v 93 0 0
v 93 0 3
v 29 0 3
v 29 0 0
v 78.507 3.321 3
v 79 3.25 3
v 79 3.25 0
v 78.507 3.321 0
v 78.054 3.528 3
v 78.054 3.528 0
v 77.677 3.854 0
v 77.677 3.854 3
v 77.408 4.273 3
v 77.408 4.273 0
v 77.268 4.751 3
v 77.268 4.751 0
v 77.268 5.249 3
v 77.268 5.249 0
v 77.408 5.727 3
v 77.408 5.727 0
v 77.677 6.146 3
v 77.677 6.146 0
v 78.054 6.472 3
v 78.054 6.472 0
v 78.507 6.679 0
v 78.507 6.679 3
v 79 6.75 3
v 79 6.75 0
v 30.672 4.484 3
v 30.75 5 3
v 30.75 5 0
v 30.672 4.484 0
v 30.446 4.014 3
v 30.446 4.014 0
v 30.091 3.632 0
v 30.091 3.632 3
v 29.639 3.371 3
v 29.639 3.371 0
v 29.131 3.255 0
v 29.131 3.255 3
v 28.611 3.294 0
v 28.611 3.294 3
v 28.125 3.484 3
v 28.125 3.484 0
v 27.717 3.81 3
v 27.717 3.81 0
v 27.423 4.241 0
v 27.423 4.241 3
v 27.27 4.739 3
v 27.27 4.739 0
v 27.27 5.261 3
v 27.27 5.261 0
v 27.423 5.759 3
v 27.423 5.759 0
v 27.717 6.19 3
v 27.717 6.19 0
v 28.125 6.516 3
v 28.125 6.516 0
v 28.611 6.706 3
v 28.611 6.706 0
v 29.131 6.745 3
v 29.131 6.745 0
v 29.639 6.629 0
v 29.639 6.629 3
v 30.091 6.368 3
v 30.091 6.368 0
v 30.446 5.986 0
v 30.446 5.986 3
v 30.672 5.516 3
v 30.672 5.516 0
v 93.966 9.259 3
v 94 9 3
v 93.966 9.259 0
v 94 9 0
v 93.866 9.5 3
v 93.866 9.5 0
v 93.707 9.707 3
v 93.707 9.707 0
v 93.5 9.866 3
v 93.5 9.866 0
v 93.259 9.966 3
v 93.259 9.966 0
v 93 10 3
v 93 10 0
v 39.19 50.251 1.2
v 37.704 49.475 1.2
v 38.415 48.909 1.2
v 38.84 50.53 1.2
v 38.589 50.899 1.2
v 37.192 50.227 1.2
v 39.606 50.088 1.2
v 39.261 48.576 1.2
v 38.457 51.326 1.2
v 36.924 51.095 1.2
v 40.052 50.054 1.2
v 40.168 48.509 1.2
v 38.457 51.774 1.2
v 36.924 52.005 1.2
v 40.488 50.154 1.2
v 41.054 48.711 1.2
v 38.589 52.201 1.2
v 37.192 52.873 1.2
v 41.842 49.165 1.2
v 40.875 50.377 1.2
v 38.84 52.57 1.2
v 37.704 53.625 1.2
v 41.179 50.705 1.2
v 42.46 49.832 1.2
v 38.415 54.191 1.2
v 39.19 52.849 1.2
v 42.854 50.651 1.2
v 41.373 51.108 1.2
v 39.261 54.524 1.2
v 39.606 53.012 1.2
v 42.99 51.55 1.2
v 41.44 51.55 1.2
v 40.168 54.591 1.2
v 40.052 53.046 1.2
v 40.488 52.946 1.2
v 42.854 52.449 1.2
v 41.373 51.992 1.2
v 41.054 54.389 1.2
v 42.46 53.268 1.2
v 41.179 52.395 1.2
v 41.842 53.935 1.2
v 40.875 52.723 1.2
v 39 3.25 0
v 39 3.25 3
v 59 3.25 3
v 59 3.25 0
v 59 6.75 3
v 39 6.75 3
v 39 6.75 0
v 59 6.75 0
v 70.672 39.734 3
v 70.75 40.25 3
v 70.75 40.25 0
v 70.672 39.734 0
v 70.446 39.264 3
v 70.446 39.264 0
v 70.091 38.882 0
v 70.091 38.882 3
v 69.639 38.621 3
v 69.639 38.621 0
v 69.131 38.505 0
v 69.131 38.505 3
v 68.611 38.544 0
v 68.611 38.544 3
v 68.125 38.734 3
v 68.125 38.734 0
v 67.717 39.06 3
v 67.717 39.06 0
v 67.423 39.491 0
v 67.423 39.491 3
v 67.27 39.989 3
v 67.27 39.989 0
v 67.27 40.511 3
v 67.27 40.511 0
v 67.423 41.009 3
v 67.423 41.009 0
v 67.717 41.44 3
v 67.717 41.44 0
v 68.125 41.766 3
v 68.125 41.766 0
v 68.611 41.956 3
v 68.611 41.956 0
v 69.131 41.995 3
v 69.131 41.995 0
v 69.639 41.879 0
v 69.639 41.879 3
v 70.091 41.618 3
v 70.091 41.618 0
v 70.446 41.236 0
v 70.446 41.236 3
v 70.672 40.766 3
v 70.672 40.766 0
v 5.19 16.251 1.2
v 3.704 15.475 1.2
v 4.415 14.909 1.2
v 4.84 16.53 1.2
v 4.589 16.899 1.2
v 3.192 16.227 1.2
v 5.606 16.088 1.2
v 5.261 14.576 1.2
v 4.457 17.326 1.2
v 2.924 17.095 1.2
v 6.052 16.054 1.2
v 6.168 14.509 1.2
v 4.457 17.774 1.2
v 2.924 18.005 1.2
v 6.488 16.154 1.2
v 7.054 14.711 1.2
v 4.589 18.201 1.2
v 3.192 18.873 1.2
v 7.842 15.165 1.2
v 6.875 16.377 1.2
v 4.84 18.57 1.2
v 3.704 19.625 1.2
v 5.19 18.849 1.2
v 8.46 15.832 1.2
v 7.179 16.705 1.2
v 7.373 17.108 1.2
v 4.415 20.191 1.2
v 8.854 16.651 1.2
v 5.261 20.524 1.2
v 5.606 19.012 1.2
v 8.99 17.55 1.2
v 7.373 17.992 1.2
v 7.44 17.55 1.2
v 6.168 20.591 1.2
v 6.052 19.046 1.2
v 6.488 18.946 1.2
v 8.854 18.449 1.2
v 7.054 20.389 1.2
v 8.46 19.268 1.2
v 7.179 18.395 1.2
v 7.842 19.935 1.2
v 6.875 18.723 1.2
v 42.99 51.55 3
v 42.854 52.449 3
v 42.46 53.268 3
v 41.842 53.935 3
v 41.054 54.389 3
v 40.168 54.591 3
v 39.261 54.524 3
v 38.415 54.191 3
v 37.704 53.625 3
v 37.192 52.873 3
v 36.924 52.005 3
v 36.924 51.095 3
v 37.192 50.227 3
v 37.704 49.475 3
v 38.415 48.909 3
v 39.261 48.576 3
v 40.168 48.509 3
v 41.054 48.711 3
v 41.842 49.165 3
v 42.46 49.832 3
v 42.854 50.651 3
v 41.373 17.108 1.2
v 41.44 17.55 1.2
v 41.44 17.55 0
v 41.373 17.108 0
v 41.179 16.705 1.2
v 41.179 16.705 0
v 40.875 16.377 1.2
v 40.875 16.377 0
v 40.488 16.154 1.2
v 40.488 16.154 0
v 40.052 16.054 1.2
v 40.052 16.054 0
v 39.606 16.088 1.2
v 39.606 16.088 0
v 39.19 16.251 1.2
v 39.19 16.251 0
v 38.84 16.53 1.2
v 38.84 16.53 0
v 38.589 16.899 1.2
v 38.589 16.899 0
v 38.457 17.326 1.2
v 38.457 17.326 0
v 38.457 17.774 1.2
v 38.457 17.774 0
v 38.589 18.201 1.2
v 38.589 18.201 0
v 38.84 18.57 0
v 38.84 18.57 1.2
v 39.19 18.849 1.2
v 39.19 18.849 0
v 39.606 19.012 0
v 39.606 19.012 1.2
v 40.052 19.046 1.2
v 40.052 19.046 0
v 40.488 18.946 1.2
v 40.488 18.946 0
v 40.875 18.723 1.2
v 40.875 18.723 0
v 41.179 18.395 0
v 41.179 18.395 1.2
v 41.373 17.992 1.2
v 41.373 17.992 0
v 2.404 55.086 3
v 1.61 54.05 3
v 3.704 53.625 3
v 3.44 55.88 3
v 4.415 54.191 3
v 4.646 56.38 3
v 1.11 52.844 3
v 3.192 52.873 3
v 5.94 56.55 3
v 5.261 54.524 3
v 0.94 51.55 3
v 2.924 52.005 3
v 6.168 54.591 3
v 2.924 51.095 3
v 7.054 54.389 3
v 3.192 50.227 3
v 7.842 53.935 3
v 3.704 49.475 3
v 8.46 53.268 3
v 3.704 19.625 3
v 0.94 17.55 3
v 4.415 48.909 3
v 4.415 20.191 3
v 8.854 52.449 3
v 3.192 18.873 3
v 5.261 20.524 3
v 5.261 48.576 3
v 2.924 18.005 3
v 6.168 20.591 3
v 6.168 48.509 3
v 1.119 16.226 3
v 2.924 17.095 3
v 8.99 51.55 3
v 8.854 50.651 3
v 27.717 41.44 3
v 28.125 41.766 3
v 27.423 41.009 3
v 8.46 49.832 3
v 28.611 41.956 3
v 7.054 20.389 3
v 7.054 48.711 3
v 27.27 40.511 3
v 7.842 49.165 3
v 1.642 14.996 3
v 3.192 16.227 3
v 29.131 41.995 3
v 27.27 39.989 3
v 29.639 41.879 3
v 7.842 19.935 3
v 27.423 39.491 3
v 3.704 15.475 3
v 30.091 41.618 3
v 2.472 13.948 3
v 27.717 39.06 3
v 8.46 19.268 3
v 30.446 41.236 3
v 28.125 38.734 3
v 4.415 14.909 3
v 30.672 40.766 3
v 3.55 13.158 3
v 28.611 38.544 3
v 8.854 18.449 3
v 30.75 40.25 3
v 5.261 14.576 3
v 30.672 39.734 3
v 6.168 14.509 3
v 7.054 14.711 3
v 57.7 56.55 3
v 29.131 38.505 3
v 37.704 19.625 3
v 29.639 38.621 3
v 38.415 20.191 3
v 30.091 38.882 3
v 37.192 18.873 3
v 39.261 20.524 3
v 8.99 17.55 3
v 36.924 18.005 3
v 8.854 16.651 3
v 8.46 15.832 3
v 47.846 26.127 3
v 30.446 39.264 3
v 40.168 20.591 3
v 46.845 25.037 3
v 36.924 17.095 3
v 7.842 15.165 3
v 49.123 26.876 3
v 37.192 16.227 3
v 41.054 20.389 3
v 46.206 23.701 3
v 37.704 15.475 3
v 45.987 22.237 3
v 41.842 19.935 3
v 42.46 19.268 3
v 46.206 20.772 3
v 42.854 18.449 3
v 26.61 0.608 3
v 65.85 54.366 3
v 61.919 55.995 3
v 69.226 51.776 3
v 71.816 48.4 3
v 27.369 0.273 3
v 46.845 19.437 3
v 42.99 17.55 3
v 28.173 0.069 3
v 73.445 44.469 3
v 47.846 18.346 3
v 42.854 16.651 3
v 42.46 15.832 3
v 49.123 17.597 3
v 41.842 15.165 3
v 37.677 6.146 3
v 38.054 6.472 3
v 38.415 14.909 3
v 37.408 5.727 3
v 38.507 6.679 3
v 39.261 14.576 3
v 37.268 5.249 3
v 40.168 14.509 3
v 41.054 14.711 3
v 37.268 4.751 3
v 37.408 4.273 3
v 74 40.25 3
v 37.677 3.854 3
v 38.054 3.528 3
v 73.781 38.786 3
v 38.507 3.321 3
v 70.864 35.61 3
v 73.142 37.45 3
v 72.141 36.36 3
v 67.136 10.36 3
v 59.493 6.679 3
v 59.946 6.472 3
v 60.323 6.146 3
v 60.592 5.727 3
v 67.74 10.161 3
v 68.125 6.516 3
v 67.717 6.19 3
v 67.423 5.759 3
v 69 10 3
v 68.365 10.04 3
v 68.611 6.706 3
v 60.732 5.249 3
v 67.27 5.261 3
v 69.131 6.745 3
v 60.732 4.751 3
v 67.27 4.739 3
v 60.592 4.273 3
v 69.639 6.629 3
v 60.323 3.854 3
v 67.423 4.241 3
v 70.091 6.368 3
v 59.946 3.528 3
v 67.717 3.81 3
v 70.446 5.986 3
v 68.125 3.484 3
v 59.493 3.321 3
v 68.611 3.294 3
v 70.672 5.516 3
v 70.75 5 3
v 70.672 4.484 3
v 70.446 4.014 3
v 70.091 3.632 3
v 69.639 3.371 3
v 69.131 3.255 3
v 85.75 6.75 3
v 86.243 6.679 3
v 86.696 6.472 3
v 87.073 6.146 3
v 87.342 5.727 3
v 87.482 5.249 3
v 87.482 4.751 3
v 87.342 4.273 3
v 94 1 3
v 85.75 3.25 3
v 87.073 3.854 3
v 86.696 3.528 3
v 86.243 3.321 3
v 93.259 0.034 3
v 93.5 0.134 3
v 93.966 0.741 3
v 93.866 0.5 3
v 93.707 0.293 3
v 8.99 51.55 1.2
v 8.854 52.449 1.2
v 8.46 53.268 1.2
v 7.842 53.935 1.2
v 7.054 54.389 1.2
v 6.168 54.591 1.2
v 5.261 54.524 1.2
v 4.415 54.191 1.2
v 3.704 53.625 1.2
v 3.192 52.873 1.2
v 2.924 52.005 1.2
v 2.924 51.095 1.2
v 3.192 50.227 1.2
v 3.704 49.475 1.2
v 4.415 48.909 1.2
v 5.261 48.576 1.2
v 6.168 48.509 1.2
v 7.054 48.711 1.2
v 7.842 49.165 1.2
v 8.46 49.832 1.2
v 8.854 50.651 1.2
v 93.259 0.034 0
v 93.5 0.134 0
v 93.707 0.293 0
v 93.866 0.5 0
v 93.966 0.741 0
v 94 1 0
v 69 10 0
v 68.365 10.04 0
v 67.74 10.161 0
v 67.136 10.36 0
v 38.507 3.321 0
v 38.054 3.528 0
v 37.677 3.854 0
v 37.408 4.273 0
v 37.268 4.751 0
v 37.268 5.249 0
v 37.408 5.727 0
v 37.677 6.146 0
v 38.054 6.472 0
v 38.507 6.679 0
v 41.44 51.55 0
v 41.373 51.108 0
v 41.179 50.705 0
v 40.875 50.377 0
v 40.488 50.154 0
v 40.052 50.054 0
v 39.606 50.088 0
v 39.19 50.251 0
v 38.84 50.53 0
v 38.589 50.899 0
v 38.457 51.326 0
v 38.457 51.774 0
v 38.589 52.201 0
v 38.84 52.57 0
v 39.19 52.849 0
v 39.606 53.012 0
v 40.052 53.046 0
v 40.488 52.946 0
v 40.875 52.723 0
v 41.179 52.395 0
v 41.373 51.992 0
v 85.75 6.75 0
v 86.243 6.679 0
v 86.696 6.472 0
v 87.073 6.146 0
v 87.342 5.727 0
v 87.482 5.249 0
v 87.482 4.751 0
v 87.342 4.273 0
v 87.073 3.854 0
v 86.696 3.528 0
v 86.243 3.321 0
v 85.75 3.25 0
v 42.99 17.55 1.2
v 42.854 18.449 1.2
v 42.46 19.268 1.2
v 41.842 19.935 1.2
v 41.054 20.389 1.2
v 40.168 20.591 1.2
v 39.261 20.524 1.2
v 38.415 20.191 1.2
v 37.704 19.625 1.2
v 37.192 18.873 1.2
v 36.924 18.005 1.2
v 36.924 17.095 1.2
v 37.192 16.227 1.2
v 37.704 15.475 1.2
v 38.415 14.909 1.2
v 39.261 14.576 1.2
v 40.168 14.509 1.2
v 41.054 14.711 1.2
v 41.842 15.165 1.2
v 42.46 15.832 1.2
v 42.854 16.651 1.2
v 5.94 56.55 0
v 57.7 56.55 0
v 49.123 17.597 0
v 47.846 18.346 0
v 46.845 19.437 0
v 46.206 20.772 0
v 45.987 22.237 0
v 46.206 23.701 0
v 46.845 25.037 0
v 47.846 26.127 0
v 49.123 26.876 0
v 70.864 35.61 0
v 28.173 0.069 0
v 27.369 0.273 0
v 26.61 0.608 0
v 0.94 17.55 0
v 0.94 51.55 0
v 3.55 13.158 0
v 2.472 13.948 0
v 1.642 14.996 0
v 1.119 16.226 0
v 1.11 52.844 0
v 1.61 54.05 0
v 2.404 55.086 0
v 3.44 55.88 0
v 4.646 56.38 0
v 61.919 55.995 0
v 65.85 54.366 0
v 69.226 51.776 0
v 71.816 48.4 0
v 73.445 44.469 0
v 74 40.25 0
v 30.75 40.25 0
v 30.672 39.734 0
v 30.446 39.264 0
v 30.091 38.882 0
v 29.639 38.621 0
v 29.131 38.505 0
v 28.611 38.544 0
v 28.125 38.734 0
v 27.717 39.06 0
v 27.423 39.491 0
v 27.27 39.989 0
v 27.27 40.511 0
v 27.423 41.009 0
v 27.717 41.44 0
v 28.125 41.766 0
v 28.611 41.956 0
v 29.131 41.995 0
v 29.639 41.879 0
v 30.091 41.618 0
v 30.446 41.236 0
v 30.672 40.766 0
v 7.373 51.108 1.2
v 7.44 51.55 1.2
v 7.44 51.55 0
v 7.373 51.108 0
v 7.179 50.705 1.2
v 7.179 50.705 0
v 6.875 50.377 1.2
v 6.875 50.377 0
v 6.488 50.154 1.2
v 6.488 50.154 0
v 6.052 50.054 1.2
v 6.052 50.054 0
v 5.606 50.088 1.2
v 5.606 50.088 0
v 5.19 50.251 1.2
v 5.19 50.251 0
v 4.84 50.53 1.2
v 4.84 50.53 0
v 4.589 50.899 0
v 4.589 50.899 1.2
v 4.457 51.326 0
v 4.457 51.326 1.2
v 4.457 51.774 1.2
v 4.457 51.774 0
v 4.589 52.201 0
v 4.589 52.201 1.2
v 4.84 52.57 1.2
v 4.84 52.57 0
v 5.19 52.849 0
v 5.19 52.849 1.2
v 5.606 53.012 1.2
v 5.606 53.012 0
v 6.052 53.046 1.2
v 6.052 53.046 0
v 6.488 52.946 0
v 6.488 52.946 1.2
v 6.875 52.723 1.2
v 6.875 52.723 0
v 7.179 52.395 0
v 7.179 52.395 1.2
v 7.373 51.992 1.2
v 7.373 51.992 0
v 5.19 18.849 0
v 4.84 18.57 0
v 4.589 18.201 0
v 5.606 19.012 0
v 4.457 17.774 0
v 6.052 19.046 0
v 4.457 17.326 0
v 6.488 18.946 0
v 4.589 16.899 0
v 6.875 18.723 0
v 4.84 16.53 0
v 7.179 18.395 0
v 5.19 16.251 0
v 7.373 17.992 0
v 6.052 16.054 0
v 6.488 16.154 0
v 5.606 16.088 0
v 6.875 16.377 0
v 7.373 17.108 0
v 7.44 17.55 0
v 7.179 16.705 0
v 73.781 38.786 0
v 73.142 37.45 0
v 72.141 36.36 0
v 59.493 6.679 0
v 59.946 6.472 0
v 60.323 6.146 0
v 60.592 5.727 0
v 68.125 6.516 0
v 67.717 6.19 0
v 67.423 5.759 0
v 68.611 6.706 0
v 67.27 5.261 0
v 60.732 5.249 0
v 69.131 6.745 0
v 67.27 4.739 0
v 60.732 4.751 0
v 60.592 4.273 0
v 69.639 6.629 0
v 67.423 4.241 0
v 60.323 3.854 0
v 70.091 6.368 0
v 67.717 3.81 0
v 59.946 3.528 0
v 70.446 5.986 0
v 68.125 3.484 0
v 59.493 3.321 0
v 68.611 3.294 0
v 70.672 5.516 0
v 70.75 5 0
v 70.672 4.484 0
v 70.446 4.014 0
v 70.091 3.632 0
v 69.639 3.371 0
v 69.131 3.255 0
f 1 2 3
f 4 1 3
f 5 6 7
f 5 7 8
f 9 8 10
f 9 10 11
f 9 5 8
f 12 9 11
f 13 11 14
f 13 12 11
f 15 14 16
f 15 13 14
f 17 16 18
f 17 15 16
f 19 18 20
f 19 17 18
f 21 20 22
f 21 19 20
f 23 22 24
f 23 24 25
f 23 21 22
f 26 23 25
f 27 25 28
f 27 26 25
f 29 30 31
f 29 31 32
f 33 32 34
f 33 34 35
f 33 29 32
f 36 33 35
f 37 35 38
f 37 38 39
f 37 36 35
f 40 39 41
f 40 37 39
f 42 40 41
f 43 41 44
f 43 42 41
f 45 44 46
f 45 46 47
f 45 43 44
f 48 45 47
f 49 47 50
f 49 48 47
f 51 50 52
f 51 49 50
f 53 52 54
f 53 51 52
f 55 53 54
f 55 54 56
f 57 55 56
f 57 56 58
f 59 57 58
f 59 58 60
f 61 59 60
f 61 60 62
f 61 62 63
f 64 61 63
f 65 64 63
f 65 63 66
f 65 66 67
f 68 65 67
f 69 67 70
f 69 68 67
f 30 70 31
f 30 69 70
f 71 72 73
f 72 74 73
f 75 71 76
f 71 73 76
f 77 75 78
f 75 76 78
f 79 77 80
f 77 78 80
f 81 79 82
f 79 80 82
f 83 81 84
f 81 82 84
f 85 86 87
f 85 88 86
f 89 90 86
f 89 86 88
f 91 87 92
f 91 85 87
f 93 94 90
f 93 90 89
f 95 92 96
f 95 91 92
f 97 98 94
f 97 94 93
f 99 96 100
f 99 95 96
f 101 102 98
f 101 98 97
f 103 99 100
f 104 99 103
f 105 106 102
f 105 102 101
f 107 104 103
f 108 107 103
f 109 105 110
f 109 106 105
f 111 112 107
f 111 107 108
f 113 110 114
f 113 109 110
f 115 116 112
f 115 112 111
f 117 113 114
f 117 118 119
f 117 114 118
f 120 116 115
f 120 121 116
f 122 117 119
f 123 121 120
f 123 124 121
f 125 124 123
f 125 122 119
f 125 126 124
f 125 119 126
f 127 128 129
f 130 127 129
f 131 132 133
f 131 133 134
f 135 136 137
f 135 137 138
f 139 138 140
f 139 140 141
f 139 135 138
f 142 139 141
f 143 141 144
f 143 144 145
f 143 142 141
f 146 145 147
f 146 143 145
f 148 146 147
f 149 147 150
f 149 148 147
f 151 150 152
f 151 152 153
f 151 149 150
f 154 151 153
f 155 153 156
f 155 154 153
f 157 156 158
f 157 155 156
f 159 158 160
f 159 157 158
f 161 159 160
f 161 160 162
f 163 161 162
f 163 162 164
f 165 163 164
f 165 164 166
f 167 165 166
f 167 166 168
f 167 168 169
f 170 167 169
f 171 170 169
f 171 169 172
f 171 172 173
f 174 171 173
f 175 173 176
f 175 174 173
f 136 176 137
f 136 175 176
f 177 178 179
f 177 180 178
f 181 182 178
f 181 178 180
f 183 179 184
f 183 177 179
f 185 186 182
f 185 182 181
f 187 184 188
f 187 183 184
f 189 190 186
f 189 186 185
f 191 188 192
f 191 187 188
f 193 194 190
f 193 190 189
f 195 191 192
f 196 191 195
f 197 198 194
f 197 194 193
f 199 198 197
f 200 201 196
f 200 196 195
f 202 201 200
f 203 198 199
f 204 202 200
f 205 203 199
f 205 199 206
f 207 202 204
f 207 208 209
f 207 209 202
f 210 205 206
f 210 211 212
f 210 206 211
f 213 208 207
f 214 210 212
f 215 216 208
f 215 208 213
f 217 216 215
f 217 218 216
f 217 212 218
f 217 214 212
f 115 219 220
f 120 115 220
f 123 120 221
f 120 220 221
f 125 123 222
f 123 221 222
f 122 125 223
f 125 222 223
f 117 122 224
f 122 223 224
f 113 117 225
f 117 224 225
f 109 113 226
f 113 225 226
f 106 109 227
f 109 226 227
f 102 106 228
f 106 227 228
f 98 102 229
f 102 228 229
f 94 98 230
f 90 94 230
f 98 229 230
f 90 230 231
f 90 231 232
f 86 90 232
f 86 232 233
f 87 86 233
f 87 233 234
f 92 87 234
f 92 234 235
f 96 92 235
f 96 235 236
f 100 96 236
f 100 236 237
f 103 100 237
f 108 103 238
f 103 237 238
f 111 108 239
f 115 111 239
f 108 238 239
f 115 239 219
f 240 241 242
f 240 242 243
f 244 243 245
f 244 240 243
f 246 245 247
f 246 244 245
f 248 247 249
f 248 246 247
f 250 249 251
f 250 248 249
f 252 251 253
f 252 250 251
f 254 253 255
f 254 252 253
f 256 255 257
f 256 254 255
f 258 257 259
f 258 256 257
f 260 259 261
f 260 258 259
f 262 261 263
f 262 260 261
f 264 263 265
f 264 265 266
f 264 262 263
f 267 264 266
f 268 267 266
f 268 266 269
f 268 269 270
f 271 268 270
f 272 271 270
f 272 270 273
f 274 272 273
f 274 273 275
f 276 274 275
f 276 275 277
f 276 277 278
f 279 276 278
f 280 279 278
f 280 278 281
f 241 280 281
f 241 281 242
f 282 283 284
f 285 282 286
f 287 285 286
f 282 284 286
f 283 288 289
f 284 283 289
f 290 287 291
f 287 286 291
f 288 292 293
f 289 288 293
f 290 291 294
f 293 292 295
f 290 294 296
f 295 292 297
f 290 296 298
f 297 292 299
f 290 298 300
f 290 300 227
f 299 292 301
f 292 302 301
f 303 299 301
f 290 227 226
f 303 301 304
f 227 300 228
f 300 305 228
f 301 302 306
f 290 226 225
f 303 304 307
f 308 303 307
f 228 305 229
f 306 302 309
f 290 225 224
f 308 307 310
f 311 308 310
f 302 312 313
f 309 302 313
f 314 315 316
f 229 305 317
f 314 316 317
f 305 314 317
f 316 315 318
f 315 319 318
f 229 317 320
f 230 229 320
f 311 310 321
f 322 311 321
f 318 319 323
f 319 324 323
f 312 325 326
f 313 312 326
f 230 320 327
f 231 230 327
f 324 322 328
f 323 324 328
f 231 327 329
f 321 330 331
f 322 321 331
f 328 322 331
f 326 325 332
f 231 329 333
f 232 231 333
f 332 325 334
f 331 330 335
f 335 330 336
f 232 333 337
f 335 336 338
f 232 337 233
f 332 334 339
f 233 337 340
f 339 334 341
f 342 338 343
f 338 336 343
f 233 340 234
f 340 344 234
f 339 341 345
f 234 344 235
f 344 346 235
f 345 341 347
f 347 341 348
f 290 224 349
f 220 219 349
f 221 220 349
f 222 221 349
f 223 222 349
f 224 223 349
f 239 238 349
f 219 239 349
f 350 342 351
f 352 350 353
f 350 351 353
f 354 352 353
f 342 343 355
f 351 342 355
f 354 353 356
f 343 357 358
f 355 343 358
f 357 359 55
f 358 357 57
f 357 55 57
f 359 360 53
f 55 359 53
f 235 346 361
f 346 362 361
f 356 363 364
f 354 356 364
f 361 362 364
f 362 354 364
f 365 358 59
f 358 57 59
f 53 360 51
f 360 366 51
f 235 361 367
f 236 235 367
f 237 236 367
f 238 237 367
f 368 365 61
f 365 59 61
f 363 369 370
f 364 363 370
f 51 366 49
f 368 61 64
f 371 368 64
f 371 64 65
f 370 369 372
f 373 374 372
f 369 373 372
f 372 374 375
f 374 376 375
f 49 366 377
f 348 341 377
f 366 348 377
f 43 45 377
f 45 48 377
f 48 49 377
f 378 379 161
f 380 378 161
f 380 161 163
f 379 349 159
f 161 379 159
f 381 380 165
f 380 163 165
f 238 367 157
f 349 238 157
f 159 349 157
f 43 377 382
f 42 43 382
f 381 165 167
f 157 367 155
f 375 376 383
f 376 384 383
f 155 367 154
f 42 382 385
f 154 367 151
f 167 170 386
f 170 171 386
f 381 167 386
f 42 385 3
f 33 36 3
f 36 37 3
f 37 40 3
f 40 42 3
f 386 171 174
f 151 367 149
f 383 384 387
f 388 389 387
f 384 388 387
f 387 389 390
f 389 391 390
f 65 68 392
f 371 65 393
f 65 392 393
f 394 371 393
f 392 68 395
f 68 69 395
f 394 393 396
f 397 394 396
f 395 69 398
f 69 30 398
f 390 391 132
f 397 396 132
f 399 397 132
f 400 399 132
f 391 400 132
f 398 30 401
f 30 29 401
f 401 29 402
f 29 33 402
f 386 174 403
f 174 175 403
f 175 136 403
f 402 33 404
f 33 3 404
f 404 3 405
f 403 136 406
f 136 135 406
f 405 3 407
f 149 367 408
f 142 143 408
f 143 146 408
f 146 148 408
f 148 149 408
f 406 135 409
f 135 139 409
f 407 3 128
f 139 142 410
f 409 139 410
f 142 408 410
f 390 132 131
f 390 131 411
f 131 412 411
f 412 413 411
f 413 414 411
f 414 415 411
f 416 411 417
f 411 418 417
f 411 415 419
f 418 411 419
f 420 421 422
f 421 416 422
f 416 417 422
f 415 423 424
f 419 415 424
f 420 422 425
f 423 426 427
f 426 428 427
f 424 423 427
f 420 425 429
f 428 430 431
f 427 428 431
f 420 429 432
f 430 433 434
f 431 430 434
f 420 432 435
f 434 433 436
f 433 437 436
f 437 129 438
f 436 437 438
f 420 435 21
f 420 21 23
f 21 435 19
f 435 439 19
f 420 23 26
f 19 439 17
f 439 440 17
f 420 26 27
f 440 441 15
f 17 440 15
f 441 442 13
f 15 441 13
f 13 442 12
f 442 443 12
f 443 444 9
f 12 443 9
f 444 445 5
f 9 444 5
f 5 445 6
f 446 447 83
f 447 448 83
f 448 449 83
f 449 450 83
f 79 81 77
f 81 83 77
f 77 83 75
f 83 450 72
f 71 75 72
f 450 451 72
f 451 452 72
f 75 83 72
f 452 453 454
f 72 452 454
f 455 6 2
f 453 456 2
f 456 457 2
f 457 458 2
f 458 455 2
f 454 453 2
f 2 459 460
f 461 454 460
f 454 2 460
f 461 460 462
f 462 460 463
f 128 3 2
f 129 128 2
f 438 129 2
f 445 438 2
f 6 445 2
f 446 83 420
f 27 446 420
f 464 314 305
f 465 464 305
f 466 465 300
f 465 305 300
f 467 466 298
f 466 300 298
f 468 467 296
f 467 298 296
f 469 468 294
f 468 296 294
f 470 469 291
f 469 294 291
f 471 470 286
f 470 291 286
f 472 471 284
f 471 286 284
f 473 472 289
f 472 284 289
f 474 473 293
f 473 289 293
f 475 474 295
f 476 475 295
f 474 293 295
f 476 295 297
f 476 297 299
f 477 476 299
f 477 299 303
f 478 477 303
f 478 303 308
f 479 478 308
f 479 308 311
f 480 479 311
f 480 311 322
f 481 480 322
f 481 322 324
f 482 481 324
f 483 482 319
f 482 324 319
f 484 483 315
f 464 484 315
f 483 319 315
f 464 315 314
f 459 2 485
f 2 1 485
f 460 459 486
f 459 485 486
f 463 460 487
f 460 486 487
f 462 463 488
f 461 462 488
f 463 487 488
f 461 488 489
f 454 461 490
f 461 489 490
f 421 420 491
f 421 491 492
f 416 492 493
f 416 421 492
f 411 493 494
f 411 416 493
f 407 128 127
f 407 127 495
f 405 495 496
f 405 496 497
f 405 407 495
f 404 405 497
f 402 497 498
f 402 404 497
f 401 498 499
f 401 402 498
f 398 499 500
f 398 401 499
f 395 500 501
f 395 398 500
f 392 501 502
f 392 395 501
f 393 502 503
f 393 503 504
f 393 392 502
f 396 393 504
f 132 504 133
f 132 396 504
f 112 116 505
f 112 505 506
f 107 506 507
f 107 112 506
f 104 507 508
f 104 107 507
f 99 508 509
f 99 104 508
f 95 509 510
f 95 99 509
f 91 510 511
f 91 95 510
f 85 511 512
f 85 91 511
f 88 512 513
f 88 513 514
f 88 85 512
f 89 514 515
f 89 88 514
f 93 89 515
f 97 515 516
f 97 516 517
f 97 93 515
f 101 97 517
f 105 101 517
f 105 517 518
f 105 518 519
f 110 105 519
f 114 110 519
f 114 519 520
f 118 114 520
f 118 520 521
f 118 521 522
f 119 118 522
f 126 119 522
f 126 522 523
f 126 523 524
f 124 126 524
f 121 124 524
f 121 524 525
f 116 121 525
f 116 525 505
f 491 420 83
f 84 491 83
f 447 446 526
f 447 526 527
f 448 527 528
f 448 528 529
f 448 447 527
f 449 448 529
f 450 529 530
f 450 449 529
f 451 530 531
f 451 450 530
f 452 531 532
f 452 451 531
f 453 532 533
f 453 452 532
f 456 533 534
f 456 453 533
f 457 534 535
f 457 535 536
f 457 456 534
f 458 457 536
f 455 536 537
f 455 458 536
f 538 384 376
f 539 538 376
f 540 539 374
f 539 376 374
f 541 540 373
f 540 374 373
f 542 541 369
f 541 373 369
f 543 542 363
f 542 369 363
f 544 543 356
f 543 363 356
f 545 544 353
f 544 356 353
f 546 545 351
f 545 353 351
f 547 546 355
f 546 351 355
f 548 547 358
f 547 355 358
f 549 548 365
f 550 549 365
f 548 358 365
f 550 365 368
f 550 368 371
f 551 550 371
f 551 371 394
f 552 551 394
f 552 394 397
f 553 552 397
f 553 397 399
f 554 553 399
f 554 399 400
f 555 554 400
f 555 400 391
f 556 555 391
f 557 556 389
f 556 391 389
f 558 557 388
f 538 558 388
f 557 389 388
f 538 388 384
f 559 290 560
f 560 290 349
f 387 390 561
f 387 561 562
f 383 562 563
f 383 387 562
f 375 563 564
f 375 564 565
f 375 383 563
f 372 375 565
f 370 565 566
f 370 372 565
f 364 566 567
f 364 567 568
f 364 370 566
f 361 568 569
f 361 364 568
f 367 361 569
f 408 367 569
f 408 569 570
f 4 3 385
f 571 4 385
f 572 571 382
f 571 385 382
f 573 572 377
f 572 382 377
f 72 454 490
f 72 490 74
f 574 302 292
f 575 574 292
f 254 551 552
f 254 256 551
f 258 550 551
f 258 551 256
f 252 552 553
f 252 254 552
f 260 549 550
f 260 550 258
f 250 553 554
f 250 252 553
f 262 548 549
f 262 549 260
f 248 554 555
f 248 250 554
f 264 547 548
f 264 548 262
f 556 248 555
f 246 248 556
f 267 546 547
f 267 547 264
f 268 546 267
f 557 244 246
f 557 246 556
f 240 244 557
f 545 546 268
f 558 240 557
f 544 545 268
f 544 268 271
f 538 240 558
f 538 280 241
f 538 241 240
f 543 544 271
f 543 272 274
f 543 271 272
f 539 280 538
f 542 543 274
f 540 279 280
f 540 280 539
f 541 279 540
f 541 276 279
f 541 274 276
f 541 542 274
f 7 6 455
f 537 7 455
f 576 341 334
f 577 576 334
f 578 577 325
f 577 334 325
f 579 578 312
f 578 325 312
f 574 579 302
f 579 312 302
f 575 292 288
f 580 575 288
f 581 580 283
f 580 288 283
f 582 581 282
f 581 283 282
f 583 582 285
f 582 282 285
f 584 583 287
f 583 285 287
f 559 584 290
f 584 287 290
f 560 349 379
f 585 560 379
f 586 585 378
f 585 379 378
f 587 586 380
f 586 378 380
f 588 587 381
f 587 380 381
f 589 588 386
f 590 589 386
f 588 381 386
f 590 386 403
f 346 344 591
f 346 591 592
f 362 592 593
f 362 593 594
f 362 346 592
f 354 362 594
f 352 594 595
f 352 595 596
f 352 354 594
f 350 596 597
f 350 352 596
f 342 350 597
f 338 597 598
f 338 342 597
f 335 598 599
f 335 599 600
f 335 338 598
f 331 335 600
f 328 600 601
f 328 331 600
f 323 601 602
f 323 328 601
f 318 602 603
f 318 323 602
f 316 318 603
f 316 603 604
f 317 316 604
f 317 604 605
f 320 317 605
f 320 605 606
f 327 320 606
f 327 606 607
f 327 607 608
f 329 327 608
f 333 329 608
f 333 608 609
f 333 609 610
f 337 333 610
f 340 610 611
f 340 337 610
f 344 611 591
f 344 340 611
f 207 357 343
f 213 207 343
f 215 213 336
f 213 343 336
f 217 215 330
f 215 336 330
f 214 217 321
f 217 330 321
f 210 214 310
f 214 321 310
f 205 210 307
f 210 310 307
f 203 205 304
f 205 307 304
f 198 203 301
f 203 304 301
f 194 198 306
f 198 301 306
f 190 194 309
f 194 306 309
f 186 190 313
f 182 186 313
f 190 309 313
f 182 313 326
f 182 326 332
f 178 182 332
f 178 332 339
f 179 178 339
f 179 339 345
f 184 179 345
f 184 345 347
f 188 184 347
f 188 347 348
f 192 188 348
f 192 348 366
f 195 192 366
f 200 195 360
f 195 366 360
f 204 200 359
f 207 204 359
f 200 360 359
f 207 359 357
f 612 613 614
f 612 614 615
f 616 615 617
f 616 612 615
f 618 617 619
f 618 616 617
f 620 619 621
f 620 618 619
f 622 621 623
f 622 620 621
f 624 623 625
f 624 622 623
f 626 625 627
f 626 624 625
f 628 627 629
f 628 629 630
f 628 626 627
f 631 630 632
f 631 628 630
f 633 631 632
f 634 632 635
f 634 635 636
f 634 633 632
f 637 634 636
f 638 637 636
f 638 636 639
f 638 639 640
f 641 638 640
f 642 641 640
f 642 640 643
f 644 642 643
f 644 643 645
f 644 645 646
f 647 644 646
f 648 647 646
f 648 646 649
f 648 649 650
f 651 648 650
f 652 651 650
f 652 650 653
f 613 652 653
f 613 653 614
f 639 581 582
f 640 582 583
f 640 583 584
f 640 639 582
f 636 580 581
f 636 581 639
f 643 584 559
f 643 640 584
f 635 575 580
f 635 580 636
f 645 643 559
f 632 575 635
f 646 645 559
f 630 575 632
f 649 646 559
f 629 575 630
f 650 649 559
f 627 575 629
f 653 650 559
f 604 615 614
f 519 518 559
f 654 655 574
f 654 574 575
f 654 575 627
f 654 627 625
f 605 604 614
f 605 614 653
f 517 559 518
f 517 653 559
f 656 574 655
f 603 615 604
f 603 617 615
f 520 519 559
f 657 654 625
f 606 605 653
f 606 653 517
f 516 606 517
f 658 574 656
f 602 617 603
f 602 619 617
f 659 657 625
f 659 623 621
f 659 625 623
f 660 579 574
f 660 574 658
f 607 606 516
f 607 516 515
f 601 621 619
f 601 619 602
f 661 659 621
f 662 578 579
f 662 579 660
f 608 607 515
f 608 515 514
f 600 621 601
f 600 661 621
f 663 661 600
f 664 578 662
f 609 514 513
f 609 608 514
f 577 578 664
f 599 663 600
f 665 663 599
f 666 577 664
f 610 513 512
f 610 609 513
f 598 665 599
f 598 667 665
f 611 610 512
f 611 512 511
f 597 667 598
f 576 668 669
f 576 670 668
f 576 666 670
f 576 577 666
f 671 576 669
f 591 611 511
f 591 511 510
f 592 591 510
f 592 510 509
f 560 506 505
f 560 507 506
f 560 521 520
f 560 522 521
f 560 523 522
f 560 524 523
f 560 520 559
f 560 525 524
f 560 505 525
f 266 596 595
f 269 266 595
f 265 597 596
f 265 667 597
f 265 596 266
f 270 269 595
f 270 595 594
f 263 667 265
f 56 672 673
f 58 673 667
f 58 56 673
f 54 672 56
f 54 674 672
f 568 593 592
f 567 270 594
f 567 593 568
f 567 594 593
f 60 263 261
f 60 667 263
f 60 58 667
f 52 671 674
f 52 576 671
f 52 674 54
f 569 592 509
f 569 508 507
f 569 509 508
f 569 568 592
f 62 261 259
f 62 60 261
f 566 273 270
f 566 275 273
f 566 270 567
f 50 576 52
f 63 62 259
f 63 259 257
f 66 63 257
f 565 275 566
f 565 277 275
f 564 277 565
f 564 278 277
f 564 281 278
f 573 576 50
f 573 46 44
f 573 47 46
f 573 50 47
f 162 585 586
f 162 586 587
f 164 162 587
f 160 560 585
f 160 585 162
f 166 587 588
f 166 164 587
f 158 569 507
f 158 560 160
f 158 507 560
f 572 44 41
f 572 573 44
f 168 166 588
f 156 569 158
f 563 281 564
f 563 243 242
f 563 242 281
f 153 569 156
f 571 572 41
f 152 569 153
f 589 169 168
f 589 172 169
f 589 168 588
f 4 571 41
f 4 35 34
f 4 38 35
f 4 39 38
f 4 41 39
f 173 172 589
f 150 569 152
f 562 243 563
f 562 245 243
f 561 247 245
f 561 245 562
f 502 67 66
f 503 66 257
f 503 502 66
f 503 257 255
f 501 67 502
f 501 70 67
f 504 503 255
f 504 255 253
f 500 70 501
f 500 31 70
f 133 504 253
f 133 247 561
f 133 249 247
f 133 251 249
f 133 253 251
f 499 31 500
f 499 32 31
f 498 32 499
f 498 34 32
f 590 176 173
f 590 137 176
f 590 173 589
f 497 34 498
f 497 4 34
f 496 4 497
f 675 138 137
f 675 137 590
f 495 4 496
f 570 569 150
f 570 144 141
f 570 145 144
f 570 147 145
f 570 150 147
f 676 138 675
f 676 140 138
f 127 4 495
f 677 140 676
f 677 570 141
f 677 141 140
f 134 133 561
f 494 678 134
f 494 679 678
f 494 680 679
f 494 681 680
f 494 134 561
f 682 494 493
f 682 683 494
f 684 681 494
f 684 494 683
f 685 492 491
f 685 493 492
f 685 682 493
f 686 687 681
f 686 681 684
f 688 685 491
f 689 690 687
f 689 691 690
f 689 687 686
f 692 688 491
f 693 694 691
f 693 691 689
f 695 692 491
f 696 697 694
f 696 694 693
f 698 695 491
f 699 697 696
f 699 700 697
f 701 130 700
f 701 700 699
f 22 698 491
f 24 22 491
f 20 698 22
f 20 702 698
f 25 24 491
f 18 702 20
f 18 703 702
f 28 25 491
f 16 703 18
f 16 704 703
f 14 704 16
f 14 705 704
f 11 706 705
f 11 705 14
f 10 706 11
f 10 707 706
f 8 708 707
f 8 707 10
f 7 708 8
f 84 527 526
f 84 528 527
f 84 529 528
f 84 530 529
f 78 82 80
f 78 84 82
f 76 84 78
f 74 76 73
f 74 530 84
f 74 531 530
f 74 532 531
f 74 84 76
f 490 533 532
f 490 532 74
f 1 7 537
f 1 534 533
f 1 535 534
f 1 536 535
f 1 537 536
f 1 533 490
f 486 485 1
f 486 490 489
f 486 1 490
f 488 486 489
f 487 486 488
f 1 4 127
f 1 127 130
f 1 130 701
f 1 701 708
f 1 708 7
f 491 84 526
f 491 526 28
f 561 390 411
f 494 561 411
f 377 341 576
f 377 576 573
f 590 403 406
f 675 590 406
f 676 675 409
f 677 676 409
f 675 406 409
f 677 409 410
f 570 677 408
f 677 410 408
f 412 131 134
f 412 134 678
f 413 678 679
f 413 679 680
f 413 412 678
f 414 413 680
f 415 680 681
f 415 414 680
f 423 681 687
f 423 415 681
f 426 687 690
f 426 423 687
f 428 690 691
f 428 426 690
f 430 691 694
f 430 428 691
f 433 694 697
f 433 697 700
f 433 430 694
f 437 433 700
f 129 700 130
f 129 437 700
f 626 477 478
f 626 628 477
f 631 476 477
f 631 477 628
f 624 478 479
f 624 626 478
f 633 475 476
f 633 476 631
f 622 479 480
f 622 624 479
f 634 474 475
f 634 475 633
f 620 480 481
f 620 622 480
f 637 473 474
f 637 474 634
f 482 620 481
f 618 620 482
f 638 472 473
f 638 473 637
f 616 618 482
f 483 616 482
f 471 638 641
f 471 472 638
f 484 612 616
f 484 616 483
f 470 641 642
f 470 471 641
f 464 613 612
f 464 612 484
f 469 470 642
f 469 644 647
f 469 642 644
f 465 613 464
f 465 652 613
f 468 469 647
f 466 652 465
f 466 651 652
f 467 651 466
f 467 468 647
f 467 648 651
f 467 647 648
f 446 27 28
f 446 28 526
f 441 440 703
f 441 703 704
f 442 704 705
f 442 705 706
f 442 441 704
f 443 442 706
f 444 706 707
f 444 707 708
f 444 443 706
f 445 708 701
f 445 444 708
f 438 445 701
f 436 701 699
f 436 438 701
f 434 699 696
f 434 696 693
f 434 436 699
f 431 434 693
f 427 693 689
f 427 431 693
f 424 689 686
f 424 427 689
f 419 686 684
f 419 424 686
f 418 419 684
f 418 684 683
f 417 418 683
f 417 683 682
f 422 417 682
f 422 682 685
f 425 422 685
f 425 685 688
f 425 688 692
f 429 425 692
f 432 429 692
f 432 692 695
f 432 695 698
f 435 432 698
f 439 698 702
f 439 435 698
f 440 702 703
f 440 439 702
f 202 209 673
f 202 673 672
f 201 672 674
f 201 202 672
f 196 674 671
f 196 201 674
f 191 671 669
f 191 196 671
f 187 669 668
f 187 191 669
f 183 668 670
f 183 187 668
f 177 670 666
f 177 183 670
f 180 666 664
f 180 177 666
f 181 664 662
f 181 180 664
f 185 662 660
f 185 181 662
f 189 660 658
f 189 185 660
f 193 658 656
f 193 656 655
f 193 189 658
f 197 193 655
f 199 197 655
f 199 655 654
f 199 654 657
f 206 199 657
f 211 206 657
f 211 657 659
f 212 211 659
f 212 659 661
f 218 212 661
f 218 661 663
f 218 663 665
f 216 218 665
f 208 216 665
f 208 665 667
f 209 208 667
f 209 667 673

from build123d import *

# Parameters (mm, degrees)
SKETCH006_R             = 1.5
SKETCH006_R_2           = 1.75
PAD002_DEPTH            = 3
FILLET_R                = 1
SKETCH_R                = 3.05
POCKET_DEPTH            = 1.8
BODY001_PLACEMENT_ANGLE = 180


with BuildPart() as part:
    # Sketch006 → Pad002 (new body)
    with BuildSketch(Plane.XY):
        with BuildLine():
            Line((5, 0), (56.76, 0))
            ThreePointArc((56.76, 0), (68.285841, 4.774159), (73.06, 16.3))
            ThreePointArc((73.06, 16.3), (72.202439, 19.100036), (69.92392, 20.939591))
            Line((48.183063, 29.673815), (69.92392, 20.939591))
            ThreePointArc((48.183063, 38.952996), (45.046983, 34.313406), (48.183063, 29.673815))
            Line((48.183063, 38.952996), (66.196084, 46.189591))
            ThreePointArc((68.060005, 46.55), (67.110782, 46.459071), (66.196084, 46.189591))
            Line((68.060005, 46.55), (93.060005, 46.55))
            Line((93.060005, 51.55), (93.060005, 46.55))
            Line((93.060005, 56.55), (93.060005, 51.55))
            Line((93.060005, 56.55), (28.06, 56.55))
            ThreePointArc((28.06, 56.55), (26.826846, 56.395547), (25.669877, 55.941732))
            Line((2.609877, 43.391732), (25.669877, 55.941732))
            ThreePointArc((2.609877, 43.391732), (0.701709, 41.554348), (0, 39))
            Line((0, 39), (0, 5))
            ThreePointArc((0, 5), (1.464466, 1.464466), (5, 0))
        make_face()
        with Locations((5, 5)):
            Circle(SKETCH006_R, mode=Mode.SUBTRACT)
        with Locations((39, 5)):
            Circle(SKETCH006_R, mode=Mode.SUBTRACT)
        with Locations((39, 39)):
            Circle(SKETCH006_R, mode=Mode.SUBTRACT)
        with Locations((5, 39)):
            Circle(SKETCH006_R, mode=Mode.SUBTRACT)
        with Locations((28.06, 51.55)):
            Circle(SKETCH006_R_2, mode=Mode.SUBTRACT)
        with Locations((68.06, 51.55)):
            Circle(SKETCH006_R_2, mode=Mode.SUBTRACT)
        with Locations((68.06, 16.3)):
            Circle(SKETCH006_R_2, mode=Mode.SUBTRACT)
        with Locations((28.06, 16.3)):
            Circle(SKETCH006_R_2, mode=Mode.SUBTRACT)
        with BuildLine():
            ThreePointArc((38.06, 53.3), (36.31, 51.55), (38.06, 49.8))
            Line((38.06, 49.8), (58.06, 49.8))
            ThreePointArc((58.06, 49.8), (59.81, 51.55), (58.06, 53.3))
            Line((38.06, 53.3), (58.06, 53.3))
        make_face(mode=Mode.SUBTRACT)
        with BuildLine():
            ThreePointArc((78.06, 53.3), (76.31, 51.55), (78.06, 49.8))
            Line((78.06, 49.8), (84.810005, 49.8))
            ThreePointArc((84.810005, 49.8), (86.560005, 51.55), (84.810005, 53.3))
            Line((78.06, 53.3), (84.810005, 53.3))
        make_face(mode=Mode.SUBTRACT)
    extrude(amount=PAD002_DEPTH)

    # Fillet
    fillet_edges = [part.edges().sort_by_distance(p)[0] for p in [
        (93.060005, 46.55, 1.5),
        (93.060005, 56.55, 1.5),
    ]]
    fillet(fillet_edges, radius=FILLET_R)

    # Sketch (on Face2 of Fillet) → Pocket (cut)
    with BuildSketch(Plane(origin=(0, 0, 0), x_dir=(1, 0, 0), z_dir=(0, 0, -1))):
        with Locations((5, -5)):
            Circle(SKETCH_R)
        with Locations((39, -5)):
            Circle(SKETCH_R)
        with Locations((39, -39)):
            Circle(SKETCH_R)
        with Locations((5, -39)):
            Circle(SKETCH_R)
    extrude(amount=-POCKET_DEPTH, mode=Mode.SUBTRACT)


with BuildPart() as part_1:
    # Body001 placement: moved
    add(part.part.moved(Location((0.94, 56.55, 3))).rotate(Axis((0.94, 56.55, 3), (1, 0, 0)), BODY001_PLACEMENT_ANGLE))


solid = part_1.part
